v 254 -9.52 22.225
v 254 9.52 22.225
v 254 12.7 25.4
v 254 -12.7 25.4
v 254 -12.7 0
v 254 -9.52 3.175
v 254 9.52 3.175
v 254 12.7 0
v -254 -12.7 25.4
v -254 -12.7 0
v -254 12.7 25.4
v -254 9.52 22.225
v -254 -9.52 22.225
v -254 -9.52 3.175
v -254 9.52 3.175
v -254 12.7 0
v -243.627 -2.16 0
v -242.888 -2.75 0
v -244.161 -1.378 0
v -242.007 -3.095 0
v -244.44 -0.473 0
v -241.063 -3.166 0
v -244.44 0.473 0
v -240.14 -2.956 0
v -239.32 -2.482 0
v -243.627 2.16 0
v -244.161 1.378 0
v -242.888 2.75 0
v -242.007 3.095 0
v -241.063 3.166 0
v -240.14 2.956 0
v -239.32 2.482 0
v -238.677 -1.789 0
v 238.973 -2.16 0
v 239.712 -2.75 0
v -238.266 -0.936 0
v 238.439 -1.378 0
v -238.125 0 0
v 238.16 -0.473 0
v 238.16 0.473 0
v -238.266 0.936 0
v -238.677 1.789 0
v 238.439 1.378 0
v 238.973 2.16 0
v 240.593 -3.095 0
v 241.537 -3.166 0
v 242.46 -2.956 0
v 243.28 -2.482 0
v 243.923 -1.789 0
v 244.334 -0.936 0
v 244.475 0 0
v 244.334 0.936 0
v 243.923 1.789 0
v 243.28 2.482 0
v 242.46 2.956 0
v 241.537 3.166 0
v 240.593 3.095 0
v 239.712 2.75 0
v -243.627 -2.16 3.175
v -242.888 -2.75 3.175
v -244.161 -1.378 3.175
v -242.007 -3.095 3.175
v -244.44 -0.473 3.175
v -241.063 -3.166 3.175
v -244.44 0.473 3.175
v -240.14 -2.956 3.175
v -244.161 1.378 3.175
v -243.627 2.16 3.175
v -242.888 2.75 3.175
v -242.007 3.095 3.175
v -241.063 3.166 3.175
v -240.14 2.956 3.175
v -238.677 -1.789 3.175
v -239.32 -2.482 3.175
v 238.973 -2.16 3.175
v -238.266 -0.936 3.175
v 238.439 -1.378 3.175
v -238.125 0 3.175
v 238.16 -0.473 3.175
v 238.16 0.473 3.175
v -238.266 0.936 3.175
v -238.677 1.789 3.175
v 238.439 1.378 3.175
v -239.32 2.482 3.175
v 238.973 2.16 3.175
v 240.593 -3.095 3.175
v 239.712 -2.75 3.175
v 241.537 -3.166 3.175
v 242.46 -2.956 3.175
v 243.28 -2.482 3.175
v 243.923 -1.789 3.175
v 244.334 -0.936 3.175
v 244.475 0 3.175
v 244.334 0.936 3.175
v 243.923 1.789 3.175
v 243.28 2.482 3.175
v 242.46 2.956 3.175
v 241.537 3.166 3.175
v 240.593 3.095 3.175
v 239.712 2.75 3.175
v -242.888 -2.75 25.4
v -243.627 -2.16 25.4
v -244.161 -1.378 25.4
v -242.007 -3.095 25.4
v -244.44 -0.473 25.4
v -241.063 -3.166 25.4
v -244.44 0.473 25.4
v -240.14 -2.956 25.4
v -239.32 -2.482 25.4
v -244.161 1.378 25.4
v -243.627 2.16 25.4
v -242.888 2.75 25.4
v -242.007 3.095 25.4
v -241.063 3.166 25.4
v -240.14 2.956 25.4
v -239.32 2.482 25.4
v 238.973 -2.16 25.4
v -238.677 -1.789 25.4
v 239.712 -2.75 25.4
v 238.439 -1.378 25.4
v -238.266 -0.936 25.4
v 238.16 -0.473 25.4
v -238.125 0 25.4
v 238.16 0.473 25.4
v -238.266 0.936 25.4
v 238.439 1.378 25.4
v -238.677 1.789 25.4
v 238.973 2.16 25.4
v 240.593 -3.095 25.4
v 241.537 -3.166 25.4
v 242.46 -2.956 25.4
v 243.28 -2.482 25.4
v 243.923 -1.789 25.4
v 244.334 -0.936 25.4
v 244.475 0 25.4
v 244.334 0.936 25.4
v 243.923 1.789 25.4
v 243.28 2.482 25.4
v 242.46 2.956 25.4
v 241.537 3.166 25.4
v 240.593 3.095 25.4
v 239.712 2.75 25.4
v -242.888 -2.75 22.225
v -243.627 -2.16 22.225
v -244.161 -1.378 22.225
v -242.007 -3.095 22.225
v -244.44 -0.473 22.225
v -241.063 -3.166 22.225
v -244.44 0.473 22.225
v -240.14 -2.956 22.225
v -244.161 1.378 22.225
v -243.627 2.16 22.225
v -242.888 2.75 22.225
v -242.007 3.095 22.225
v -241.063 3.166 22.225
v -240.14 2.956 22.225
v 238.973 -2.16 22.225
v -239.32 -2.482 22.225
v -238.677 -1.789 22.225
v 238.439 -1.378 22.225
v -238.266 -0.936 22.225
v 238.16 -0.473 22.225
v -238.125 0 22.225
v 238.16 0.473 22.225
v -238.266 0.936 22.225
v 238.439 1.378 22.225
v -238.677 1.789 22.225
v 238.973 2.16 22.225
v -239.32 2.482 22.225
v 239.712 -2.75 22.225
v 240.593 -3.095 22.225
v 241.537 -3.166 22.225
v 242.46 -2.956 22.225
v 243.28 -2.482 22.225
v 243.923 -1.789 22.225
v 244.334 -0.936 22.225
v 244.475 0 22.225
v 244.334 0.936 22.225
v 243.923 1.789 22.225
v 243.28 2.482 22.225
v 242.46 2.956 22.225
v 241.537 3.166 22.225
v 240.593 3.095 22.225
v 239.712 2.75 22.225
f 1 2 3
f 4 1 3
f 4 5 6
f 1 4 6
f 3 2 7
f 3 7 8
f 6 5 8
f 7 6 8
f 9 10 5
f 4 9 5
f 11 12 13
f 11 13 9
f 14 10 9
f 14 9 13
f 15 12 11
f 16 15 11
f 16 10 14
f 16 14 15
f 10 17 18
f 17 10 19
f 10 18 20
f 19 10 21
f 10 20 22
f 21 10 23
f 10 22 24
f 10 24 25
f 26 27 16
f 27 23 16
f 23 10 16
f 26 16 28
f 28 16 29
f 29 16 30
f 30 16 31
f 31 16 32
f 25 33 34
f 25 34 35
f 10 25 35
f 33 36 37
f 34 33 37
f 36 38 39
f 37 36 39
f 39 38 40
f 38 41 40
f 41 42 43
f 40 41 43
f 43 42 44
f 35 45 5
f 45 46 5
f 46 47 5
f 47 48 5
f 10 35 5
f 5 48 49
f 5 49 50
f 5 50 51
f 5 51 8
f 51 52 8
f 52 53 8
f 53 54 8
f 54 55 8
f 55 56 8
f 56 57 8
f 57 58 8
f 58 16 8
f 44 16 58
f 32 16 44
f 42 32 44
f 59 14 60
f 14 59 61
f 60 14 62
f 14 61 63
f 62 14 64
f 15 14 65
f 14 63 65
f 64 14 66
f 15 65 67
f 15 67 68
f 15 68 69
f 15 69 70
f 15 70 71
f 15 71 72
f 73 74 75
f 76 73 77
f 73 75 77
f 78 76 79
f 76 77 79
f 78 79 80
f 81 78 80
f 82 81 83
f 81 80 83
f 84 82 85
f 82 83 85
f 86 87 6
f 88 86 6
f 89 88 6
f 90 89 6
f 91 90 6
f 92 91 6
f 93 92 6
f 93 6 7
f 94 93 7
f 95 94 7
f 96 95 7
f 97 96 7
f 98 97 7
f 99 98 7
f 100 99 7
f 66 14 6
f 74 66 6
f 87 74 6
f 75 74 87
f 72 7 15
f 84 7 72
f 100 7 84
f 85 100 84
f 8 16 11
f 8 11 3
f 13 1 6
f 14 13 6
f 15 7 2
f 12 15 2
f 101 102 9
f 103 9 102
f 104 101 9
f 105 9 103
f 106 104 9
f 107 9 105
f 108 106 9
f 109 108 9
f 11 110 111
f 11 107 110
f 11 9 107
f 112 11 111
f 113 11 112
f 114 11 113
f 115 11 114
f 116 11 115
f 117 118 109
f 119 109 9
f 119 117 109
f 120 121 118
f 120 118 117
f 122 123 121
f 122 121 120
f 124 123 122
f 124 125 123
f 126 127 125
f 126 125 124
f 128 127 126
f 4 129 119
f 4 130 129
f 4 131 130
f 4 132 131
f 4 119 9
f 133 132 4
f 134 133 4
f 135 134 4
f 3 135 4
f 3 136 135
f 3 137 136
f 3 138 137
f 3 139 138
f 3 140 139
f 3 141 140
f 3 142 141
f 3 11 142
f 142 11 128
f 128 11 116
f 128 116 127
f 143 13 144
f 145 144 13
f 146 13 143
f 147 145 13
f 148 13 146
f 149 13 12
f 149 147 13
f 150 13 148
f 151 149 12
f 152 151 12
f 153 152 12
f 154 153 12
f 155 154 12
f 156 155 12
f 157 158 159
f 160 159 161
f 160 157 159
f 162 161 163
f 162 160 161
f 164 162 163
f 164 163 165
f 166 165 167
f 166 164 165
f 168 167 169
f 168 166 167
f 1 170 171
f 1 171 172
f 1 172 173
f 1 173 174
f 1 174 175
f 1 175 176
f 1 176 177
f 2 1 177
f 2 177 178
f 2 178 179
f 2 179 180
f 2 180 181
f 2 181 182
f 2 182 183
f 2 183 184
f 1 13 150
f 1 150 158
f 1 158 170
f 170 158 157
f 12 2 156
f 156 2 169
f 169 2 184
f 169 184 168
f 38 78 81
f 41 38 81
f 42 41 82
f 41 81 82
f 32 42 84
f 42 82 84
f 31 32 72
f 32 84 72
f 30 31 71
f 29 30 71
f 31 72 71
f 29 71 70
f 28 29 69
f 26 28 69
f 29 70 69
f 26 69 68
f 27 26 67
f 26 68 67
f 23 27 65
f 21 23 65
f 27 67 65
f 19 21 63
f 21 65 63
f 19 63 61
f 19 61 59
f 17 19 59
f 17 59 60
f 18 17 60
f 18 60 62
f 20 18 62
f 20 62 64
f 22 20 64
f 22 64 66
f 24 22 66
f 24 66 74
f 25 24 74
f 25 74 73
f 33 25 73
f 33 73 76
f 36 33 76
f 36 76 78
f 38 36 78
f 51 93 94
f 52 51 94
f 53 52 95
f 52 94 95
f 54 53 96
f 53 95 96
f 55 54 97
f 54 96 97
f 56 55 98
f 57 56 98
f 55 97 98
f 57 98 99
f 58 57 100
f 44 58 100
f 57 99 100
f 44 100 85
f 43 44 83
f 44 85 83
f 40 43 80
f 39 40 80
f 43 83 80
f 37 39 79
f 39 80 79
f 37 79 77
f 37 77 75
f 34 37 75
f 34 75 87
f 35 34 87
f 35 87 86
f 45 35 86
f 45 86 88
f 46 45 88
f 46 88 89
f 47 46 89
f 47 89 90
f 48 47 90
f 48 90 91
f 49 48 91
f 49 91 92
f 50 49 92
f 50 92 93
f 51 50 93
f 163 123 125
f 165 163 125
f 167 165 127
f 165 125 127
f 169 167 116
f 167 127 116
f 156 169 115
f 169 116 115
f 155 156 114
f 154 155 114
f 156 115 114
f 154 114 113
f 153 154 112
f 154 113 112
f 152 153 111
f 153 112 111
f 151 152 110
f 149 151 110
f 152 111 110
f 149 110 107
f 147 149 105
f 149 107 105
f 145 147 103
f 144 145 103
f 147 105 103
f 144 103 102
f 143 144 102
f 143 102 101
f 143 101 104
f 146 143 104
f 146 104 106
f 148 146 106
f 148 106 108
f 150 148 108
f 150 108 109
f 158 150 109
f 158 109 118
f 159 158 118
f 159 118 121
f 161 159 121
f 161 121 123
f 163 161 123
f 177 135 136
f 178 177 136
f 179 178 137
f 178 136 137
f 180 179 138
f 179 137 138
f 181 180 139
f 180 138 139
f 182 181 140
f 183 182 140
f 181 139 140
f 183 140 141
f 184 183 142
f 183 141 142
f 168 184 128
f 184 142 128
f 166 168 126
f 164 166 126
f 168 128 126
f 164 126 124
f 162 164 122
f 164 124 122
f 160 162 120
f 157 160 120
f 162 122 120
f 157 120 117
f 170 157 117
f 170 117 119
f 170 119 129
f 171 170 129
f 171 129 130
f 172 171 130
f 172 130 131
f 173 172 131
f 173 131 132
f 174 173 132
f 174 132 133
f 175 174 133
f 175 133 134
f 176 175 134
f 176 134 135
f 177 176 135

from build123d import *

# Parameters (mm, degrees)
SKETCH1_W           = 508
SKETCH1_H           = 25.4
BOSS_EXTRUDE1_DEPTH = 25.4
SKETCH2_W           = 9.525
SKETCH2_H           = 19.040717284
CUT_EXTRUDE1_DEPTH  = 508
SKETCH3_R           = 3.175
CUT_EXTRUDE2_DEPTH  = 508


with BuildPart() as part:
    # Sketch1 → Boss-Extrude1 (new body)
    with BuildSketch(Plane.XY):
        Rectangle(SKETCH1_W, SKETCH1_H)
    extrude(amount=BOSS_EXTRUDE1_DEPTH)

    # Sketch2 → Cut-Extrude1 (cut)
    with BuildSketch(Plane(origin=(254, 0, 0), x_dir=(0, 0, -1), z_dir=(1, 0, 0))):
        with Locations((-17.4625, 0)):
            Rectangle(SKETCH2_W, SKETCH2_H)
        with Locations((-7.9375, 0)):
            Rectangle(SKETCH2_W, SKETCH2_H)
    extrude(amount=-CUT_EXTRUDE1_DEPTH, mode=Mode.SUBTRACT)

    # Sketch3 → Cut-Extrude2 (cut)
    with BuildSketch(Plane.XY.offset(25.4)):
        with Locations((241.3, 0)):
            Circle(SKETCH3_R)
        with Locations((-241.3, 0)):
            Circle(SKETCH3_R)
    extrude(amount=-CUT_EXTRUDE2_DEPTH, mode=Mode.SUBTRACT)


solid = part.part
